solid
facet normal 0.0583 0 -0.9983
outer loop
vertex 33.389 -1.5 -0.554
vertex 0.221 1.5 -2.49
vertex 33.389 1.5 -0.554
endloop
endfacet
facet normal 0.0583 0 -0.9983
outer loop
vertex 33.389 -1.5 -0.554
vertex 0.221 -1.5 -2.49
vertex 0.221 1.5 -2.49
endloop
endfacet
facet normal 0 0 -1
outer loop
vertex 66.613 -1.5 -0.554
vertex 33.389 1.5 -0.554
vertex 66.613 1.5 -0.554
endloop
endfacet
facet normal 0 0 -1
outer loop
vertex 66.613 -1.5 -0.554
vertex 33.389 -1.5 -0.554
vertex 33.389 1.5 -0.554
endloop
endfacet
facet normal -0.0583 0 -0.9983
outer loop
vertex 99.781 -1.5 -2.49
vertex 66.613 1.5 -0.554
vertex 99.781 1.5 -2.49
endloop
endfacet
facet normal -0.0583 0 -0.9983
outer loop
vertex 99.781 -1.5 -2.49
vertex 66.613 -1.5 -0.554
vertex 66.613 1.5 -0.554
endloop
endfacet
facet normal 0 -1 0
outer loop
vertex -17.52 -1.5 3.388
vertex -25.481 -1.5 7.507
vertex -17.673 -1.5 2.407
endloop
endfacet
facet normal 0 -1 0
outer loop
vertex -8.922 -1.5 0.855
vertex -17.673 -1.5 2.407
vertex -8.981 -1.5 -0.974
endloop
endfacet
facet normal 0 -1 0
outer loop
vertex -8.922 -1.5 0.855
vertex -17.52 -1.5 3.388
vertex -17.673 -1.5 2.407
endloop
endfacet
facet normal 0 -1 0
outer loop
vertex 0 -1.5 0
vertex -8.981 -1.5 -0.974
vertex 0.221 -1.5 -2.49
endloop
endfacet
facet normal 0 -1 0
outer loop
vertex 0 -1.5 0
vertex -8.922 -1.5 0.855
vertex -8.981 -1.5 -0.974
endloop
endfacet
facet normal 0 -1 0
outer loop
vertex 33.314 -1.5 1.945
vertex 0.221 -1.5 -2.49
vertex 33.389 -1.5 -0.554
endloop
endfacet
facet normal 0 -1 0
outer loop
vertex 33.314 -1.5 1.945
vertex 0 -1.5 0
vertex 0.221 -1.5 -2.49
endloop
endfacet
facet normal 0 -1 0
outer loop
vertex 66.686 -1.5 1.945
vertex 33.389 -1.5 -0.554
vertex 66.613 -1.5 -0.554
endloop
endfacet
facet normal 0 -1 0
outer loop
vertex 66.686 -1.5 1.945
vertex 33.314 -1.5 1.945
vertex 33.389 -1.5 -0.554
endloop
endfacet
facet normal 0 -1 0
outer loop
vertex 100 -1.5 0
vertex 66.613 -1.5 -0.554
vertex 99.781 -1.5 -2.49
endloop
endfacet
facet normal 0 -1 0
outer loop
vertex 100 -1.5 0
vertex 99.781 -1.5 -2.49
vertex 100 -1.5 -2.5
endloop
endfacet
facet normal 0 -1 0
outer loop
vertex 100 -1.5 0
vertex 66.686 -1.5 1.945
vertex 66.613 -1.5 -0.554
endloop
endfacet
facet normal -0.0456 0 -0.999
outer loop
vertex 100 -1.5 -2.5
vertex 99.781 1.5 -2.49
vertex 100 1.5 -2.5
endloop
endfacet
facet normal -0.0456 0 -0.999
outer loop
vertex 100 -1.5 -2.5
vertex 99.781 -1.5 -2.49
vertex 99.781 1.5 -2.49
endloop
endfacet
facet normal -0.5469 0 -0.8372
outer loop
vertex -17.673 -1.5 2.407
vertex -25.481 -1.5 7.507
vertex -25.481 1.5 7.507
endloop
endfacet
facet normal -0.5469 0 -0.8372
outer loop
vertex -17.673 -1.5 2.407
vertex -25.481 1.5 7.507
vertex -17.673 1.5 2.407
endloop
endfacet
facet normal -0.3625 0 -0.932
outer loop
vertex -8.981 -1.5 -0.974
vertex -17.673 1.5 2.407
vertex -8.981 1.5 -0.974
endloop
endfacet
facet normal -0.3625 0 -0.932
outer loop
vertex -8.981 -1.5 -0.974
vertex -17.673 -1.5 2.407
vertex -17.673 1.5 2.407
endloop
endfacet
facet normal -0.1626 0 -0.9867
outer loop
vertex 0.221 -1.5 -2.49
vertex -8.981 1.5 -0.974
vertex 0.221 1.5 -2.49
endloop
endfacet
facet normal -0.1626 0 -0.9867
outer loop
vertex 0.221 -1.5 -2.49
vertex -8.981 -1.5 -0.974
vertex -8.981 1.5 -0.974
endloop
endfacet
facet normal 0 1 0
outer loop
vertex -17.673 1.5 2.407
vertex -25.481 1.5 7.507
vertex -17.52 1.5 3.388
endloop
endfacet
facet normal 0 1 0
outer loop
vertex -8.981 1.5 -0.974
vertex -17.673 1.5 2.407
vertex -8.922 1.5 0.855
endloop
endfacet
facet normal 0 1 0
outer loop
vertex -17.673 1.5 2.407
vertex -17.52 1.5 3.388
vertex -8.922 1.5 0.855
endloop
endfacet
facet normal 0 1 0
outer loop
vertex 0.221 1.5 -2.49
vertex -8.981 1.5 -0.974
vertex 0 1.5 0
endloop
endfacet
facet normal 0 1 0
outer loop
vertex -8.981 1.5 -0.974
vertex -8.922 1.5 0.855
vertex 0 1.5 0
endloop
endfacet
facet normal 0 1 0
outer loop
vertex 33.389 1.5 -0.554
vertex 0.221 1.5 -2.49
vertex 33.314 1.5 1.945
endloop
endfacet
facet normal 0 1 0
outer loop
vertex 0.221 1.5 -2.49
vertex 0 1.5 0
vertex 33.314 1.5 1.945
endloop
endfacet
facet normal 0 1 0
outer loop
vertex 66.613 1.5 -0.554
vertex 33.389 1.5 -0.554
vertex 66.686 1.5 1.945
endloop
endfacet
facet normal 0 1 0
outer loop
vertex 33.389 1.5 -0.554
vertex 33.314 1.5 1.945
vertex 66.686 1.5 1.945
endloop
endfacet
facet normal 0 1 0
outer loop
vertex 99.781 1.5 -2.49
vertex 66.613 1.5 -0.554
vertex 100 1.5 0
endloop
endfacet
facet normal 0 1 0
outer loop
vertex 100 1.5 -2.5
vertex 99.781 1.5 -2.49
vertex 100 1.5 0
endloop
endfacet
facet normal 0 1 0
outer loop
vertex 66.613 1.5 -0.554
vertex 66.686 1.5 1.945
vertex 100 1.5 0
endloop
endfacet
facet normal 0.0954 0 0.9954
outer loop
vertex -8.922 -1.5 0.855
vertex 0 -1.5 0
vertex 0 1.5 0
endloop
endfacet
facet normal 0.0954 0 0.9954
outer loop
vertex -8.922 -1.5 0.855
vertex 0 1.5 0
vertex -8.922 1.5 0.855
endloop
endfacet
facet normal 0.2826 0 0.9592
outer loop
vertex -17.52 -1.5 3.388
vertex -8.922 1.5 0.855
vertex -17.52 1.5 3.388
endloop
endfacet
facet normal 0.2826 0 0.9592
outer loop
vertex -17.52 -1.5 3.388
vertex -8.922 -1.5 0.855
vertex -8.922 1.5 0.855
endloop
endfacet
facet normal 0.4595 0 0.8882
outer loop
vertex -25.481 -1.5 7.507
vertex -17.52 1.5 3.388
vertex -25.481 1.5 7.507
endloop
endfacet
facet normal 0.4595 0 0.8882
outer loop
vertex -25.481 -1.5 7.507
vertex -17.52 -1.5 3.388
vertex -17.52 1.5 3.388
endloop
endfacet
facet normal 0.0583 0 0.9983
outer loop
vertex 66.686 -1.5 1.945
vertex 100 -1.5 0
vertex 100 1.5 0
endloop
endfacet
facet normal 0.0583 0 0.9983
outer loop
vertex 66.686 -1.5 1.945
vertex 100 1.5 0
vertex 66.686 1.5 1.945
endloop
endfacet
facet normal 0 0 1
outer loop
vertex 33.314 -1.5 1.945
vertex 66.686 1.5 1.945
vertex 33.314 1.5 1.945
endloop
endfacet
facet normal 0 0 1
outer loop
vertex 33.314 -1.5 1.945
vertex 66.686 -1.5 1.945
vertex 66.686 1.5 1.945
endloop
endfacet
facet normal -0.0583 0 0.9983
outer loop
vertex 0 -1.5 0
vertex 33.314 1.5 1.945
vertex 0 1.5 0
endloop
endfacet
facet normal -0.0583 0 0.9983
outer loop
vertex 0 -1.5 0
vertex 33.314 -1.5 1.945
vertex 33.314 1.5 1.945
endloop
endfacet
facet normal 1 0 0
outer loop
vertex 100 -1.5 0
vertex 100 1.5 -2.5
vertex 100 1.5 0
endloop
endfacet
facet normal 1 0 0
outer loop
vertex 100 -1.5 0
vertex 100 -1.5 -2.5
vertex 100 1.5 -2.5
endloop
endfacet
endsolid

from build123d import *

# Parameters (mm, degrees)
F1_DEPTH = 1.5


with BuildPart() as f1:
    # F0 (on Front) → F1 (new body, symmetric)
    with BuildSketch(Plane.XZ):
        with BuildLine():
            Line((100, -2.5), (100, 0))
            ThreePointArc((100, 0), (50, 2.187736944), (0, 0))
            ThreePointArc((0, 0), (-13.2819680374, 1.9157530278), (-25.4811713734, 7.5068372317))
            ThreePointArc((-25.4811713734, 7.5068372317), (-13.4145892568, 0.4908203215), (0.2214126109, -2.490177888))
            ThreePointArc((0.2214126109, -2.490177888), (50.0013164202, -0.3122630575), (99.7812101684, -2.4904078382))
            Line((99.7812101684, -2.4904078382), (100, -2.5))
        make_face()
    extrude(amount=F1_DEPTH, both=True)


solid = f1.part
